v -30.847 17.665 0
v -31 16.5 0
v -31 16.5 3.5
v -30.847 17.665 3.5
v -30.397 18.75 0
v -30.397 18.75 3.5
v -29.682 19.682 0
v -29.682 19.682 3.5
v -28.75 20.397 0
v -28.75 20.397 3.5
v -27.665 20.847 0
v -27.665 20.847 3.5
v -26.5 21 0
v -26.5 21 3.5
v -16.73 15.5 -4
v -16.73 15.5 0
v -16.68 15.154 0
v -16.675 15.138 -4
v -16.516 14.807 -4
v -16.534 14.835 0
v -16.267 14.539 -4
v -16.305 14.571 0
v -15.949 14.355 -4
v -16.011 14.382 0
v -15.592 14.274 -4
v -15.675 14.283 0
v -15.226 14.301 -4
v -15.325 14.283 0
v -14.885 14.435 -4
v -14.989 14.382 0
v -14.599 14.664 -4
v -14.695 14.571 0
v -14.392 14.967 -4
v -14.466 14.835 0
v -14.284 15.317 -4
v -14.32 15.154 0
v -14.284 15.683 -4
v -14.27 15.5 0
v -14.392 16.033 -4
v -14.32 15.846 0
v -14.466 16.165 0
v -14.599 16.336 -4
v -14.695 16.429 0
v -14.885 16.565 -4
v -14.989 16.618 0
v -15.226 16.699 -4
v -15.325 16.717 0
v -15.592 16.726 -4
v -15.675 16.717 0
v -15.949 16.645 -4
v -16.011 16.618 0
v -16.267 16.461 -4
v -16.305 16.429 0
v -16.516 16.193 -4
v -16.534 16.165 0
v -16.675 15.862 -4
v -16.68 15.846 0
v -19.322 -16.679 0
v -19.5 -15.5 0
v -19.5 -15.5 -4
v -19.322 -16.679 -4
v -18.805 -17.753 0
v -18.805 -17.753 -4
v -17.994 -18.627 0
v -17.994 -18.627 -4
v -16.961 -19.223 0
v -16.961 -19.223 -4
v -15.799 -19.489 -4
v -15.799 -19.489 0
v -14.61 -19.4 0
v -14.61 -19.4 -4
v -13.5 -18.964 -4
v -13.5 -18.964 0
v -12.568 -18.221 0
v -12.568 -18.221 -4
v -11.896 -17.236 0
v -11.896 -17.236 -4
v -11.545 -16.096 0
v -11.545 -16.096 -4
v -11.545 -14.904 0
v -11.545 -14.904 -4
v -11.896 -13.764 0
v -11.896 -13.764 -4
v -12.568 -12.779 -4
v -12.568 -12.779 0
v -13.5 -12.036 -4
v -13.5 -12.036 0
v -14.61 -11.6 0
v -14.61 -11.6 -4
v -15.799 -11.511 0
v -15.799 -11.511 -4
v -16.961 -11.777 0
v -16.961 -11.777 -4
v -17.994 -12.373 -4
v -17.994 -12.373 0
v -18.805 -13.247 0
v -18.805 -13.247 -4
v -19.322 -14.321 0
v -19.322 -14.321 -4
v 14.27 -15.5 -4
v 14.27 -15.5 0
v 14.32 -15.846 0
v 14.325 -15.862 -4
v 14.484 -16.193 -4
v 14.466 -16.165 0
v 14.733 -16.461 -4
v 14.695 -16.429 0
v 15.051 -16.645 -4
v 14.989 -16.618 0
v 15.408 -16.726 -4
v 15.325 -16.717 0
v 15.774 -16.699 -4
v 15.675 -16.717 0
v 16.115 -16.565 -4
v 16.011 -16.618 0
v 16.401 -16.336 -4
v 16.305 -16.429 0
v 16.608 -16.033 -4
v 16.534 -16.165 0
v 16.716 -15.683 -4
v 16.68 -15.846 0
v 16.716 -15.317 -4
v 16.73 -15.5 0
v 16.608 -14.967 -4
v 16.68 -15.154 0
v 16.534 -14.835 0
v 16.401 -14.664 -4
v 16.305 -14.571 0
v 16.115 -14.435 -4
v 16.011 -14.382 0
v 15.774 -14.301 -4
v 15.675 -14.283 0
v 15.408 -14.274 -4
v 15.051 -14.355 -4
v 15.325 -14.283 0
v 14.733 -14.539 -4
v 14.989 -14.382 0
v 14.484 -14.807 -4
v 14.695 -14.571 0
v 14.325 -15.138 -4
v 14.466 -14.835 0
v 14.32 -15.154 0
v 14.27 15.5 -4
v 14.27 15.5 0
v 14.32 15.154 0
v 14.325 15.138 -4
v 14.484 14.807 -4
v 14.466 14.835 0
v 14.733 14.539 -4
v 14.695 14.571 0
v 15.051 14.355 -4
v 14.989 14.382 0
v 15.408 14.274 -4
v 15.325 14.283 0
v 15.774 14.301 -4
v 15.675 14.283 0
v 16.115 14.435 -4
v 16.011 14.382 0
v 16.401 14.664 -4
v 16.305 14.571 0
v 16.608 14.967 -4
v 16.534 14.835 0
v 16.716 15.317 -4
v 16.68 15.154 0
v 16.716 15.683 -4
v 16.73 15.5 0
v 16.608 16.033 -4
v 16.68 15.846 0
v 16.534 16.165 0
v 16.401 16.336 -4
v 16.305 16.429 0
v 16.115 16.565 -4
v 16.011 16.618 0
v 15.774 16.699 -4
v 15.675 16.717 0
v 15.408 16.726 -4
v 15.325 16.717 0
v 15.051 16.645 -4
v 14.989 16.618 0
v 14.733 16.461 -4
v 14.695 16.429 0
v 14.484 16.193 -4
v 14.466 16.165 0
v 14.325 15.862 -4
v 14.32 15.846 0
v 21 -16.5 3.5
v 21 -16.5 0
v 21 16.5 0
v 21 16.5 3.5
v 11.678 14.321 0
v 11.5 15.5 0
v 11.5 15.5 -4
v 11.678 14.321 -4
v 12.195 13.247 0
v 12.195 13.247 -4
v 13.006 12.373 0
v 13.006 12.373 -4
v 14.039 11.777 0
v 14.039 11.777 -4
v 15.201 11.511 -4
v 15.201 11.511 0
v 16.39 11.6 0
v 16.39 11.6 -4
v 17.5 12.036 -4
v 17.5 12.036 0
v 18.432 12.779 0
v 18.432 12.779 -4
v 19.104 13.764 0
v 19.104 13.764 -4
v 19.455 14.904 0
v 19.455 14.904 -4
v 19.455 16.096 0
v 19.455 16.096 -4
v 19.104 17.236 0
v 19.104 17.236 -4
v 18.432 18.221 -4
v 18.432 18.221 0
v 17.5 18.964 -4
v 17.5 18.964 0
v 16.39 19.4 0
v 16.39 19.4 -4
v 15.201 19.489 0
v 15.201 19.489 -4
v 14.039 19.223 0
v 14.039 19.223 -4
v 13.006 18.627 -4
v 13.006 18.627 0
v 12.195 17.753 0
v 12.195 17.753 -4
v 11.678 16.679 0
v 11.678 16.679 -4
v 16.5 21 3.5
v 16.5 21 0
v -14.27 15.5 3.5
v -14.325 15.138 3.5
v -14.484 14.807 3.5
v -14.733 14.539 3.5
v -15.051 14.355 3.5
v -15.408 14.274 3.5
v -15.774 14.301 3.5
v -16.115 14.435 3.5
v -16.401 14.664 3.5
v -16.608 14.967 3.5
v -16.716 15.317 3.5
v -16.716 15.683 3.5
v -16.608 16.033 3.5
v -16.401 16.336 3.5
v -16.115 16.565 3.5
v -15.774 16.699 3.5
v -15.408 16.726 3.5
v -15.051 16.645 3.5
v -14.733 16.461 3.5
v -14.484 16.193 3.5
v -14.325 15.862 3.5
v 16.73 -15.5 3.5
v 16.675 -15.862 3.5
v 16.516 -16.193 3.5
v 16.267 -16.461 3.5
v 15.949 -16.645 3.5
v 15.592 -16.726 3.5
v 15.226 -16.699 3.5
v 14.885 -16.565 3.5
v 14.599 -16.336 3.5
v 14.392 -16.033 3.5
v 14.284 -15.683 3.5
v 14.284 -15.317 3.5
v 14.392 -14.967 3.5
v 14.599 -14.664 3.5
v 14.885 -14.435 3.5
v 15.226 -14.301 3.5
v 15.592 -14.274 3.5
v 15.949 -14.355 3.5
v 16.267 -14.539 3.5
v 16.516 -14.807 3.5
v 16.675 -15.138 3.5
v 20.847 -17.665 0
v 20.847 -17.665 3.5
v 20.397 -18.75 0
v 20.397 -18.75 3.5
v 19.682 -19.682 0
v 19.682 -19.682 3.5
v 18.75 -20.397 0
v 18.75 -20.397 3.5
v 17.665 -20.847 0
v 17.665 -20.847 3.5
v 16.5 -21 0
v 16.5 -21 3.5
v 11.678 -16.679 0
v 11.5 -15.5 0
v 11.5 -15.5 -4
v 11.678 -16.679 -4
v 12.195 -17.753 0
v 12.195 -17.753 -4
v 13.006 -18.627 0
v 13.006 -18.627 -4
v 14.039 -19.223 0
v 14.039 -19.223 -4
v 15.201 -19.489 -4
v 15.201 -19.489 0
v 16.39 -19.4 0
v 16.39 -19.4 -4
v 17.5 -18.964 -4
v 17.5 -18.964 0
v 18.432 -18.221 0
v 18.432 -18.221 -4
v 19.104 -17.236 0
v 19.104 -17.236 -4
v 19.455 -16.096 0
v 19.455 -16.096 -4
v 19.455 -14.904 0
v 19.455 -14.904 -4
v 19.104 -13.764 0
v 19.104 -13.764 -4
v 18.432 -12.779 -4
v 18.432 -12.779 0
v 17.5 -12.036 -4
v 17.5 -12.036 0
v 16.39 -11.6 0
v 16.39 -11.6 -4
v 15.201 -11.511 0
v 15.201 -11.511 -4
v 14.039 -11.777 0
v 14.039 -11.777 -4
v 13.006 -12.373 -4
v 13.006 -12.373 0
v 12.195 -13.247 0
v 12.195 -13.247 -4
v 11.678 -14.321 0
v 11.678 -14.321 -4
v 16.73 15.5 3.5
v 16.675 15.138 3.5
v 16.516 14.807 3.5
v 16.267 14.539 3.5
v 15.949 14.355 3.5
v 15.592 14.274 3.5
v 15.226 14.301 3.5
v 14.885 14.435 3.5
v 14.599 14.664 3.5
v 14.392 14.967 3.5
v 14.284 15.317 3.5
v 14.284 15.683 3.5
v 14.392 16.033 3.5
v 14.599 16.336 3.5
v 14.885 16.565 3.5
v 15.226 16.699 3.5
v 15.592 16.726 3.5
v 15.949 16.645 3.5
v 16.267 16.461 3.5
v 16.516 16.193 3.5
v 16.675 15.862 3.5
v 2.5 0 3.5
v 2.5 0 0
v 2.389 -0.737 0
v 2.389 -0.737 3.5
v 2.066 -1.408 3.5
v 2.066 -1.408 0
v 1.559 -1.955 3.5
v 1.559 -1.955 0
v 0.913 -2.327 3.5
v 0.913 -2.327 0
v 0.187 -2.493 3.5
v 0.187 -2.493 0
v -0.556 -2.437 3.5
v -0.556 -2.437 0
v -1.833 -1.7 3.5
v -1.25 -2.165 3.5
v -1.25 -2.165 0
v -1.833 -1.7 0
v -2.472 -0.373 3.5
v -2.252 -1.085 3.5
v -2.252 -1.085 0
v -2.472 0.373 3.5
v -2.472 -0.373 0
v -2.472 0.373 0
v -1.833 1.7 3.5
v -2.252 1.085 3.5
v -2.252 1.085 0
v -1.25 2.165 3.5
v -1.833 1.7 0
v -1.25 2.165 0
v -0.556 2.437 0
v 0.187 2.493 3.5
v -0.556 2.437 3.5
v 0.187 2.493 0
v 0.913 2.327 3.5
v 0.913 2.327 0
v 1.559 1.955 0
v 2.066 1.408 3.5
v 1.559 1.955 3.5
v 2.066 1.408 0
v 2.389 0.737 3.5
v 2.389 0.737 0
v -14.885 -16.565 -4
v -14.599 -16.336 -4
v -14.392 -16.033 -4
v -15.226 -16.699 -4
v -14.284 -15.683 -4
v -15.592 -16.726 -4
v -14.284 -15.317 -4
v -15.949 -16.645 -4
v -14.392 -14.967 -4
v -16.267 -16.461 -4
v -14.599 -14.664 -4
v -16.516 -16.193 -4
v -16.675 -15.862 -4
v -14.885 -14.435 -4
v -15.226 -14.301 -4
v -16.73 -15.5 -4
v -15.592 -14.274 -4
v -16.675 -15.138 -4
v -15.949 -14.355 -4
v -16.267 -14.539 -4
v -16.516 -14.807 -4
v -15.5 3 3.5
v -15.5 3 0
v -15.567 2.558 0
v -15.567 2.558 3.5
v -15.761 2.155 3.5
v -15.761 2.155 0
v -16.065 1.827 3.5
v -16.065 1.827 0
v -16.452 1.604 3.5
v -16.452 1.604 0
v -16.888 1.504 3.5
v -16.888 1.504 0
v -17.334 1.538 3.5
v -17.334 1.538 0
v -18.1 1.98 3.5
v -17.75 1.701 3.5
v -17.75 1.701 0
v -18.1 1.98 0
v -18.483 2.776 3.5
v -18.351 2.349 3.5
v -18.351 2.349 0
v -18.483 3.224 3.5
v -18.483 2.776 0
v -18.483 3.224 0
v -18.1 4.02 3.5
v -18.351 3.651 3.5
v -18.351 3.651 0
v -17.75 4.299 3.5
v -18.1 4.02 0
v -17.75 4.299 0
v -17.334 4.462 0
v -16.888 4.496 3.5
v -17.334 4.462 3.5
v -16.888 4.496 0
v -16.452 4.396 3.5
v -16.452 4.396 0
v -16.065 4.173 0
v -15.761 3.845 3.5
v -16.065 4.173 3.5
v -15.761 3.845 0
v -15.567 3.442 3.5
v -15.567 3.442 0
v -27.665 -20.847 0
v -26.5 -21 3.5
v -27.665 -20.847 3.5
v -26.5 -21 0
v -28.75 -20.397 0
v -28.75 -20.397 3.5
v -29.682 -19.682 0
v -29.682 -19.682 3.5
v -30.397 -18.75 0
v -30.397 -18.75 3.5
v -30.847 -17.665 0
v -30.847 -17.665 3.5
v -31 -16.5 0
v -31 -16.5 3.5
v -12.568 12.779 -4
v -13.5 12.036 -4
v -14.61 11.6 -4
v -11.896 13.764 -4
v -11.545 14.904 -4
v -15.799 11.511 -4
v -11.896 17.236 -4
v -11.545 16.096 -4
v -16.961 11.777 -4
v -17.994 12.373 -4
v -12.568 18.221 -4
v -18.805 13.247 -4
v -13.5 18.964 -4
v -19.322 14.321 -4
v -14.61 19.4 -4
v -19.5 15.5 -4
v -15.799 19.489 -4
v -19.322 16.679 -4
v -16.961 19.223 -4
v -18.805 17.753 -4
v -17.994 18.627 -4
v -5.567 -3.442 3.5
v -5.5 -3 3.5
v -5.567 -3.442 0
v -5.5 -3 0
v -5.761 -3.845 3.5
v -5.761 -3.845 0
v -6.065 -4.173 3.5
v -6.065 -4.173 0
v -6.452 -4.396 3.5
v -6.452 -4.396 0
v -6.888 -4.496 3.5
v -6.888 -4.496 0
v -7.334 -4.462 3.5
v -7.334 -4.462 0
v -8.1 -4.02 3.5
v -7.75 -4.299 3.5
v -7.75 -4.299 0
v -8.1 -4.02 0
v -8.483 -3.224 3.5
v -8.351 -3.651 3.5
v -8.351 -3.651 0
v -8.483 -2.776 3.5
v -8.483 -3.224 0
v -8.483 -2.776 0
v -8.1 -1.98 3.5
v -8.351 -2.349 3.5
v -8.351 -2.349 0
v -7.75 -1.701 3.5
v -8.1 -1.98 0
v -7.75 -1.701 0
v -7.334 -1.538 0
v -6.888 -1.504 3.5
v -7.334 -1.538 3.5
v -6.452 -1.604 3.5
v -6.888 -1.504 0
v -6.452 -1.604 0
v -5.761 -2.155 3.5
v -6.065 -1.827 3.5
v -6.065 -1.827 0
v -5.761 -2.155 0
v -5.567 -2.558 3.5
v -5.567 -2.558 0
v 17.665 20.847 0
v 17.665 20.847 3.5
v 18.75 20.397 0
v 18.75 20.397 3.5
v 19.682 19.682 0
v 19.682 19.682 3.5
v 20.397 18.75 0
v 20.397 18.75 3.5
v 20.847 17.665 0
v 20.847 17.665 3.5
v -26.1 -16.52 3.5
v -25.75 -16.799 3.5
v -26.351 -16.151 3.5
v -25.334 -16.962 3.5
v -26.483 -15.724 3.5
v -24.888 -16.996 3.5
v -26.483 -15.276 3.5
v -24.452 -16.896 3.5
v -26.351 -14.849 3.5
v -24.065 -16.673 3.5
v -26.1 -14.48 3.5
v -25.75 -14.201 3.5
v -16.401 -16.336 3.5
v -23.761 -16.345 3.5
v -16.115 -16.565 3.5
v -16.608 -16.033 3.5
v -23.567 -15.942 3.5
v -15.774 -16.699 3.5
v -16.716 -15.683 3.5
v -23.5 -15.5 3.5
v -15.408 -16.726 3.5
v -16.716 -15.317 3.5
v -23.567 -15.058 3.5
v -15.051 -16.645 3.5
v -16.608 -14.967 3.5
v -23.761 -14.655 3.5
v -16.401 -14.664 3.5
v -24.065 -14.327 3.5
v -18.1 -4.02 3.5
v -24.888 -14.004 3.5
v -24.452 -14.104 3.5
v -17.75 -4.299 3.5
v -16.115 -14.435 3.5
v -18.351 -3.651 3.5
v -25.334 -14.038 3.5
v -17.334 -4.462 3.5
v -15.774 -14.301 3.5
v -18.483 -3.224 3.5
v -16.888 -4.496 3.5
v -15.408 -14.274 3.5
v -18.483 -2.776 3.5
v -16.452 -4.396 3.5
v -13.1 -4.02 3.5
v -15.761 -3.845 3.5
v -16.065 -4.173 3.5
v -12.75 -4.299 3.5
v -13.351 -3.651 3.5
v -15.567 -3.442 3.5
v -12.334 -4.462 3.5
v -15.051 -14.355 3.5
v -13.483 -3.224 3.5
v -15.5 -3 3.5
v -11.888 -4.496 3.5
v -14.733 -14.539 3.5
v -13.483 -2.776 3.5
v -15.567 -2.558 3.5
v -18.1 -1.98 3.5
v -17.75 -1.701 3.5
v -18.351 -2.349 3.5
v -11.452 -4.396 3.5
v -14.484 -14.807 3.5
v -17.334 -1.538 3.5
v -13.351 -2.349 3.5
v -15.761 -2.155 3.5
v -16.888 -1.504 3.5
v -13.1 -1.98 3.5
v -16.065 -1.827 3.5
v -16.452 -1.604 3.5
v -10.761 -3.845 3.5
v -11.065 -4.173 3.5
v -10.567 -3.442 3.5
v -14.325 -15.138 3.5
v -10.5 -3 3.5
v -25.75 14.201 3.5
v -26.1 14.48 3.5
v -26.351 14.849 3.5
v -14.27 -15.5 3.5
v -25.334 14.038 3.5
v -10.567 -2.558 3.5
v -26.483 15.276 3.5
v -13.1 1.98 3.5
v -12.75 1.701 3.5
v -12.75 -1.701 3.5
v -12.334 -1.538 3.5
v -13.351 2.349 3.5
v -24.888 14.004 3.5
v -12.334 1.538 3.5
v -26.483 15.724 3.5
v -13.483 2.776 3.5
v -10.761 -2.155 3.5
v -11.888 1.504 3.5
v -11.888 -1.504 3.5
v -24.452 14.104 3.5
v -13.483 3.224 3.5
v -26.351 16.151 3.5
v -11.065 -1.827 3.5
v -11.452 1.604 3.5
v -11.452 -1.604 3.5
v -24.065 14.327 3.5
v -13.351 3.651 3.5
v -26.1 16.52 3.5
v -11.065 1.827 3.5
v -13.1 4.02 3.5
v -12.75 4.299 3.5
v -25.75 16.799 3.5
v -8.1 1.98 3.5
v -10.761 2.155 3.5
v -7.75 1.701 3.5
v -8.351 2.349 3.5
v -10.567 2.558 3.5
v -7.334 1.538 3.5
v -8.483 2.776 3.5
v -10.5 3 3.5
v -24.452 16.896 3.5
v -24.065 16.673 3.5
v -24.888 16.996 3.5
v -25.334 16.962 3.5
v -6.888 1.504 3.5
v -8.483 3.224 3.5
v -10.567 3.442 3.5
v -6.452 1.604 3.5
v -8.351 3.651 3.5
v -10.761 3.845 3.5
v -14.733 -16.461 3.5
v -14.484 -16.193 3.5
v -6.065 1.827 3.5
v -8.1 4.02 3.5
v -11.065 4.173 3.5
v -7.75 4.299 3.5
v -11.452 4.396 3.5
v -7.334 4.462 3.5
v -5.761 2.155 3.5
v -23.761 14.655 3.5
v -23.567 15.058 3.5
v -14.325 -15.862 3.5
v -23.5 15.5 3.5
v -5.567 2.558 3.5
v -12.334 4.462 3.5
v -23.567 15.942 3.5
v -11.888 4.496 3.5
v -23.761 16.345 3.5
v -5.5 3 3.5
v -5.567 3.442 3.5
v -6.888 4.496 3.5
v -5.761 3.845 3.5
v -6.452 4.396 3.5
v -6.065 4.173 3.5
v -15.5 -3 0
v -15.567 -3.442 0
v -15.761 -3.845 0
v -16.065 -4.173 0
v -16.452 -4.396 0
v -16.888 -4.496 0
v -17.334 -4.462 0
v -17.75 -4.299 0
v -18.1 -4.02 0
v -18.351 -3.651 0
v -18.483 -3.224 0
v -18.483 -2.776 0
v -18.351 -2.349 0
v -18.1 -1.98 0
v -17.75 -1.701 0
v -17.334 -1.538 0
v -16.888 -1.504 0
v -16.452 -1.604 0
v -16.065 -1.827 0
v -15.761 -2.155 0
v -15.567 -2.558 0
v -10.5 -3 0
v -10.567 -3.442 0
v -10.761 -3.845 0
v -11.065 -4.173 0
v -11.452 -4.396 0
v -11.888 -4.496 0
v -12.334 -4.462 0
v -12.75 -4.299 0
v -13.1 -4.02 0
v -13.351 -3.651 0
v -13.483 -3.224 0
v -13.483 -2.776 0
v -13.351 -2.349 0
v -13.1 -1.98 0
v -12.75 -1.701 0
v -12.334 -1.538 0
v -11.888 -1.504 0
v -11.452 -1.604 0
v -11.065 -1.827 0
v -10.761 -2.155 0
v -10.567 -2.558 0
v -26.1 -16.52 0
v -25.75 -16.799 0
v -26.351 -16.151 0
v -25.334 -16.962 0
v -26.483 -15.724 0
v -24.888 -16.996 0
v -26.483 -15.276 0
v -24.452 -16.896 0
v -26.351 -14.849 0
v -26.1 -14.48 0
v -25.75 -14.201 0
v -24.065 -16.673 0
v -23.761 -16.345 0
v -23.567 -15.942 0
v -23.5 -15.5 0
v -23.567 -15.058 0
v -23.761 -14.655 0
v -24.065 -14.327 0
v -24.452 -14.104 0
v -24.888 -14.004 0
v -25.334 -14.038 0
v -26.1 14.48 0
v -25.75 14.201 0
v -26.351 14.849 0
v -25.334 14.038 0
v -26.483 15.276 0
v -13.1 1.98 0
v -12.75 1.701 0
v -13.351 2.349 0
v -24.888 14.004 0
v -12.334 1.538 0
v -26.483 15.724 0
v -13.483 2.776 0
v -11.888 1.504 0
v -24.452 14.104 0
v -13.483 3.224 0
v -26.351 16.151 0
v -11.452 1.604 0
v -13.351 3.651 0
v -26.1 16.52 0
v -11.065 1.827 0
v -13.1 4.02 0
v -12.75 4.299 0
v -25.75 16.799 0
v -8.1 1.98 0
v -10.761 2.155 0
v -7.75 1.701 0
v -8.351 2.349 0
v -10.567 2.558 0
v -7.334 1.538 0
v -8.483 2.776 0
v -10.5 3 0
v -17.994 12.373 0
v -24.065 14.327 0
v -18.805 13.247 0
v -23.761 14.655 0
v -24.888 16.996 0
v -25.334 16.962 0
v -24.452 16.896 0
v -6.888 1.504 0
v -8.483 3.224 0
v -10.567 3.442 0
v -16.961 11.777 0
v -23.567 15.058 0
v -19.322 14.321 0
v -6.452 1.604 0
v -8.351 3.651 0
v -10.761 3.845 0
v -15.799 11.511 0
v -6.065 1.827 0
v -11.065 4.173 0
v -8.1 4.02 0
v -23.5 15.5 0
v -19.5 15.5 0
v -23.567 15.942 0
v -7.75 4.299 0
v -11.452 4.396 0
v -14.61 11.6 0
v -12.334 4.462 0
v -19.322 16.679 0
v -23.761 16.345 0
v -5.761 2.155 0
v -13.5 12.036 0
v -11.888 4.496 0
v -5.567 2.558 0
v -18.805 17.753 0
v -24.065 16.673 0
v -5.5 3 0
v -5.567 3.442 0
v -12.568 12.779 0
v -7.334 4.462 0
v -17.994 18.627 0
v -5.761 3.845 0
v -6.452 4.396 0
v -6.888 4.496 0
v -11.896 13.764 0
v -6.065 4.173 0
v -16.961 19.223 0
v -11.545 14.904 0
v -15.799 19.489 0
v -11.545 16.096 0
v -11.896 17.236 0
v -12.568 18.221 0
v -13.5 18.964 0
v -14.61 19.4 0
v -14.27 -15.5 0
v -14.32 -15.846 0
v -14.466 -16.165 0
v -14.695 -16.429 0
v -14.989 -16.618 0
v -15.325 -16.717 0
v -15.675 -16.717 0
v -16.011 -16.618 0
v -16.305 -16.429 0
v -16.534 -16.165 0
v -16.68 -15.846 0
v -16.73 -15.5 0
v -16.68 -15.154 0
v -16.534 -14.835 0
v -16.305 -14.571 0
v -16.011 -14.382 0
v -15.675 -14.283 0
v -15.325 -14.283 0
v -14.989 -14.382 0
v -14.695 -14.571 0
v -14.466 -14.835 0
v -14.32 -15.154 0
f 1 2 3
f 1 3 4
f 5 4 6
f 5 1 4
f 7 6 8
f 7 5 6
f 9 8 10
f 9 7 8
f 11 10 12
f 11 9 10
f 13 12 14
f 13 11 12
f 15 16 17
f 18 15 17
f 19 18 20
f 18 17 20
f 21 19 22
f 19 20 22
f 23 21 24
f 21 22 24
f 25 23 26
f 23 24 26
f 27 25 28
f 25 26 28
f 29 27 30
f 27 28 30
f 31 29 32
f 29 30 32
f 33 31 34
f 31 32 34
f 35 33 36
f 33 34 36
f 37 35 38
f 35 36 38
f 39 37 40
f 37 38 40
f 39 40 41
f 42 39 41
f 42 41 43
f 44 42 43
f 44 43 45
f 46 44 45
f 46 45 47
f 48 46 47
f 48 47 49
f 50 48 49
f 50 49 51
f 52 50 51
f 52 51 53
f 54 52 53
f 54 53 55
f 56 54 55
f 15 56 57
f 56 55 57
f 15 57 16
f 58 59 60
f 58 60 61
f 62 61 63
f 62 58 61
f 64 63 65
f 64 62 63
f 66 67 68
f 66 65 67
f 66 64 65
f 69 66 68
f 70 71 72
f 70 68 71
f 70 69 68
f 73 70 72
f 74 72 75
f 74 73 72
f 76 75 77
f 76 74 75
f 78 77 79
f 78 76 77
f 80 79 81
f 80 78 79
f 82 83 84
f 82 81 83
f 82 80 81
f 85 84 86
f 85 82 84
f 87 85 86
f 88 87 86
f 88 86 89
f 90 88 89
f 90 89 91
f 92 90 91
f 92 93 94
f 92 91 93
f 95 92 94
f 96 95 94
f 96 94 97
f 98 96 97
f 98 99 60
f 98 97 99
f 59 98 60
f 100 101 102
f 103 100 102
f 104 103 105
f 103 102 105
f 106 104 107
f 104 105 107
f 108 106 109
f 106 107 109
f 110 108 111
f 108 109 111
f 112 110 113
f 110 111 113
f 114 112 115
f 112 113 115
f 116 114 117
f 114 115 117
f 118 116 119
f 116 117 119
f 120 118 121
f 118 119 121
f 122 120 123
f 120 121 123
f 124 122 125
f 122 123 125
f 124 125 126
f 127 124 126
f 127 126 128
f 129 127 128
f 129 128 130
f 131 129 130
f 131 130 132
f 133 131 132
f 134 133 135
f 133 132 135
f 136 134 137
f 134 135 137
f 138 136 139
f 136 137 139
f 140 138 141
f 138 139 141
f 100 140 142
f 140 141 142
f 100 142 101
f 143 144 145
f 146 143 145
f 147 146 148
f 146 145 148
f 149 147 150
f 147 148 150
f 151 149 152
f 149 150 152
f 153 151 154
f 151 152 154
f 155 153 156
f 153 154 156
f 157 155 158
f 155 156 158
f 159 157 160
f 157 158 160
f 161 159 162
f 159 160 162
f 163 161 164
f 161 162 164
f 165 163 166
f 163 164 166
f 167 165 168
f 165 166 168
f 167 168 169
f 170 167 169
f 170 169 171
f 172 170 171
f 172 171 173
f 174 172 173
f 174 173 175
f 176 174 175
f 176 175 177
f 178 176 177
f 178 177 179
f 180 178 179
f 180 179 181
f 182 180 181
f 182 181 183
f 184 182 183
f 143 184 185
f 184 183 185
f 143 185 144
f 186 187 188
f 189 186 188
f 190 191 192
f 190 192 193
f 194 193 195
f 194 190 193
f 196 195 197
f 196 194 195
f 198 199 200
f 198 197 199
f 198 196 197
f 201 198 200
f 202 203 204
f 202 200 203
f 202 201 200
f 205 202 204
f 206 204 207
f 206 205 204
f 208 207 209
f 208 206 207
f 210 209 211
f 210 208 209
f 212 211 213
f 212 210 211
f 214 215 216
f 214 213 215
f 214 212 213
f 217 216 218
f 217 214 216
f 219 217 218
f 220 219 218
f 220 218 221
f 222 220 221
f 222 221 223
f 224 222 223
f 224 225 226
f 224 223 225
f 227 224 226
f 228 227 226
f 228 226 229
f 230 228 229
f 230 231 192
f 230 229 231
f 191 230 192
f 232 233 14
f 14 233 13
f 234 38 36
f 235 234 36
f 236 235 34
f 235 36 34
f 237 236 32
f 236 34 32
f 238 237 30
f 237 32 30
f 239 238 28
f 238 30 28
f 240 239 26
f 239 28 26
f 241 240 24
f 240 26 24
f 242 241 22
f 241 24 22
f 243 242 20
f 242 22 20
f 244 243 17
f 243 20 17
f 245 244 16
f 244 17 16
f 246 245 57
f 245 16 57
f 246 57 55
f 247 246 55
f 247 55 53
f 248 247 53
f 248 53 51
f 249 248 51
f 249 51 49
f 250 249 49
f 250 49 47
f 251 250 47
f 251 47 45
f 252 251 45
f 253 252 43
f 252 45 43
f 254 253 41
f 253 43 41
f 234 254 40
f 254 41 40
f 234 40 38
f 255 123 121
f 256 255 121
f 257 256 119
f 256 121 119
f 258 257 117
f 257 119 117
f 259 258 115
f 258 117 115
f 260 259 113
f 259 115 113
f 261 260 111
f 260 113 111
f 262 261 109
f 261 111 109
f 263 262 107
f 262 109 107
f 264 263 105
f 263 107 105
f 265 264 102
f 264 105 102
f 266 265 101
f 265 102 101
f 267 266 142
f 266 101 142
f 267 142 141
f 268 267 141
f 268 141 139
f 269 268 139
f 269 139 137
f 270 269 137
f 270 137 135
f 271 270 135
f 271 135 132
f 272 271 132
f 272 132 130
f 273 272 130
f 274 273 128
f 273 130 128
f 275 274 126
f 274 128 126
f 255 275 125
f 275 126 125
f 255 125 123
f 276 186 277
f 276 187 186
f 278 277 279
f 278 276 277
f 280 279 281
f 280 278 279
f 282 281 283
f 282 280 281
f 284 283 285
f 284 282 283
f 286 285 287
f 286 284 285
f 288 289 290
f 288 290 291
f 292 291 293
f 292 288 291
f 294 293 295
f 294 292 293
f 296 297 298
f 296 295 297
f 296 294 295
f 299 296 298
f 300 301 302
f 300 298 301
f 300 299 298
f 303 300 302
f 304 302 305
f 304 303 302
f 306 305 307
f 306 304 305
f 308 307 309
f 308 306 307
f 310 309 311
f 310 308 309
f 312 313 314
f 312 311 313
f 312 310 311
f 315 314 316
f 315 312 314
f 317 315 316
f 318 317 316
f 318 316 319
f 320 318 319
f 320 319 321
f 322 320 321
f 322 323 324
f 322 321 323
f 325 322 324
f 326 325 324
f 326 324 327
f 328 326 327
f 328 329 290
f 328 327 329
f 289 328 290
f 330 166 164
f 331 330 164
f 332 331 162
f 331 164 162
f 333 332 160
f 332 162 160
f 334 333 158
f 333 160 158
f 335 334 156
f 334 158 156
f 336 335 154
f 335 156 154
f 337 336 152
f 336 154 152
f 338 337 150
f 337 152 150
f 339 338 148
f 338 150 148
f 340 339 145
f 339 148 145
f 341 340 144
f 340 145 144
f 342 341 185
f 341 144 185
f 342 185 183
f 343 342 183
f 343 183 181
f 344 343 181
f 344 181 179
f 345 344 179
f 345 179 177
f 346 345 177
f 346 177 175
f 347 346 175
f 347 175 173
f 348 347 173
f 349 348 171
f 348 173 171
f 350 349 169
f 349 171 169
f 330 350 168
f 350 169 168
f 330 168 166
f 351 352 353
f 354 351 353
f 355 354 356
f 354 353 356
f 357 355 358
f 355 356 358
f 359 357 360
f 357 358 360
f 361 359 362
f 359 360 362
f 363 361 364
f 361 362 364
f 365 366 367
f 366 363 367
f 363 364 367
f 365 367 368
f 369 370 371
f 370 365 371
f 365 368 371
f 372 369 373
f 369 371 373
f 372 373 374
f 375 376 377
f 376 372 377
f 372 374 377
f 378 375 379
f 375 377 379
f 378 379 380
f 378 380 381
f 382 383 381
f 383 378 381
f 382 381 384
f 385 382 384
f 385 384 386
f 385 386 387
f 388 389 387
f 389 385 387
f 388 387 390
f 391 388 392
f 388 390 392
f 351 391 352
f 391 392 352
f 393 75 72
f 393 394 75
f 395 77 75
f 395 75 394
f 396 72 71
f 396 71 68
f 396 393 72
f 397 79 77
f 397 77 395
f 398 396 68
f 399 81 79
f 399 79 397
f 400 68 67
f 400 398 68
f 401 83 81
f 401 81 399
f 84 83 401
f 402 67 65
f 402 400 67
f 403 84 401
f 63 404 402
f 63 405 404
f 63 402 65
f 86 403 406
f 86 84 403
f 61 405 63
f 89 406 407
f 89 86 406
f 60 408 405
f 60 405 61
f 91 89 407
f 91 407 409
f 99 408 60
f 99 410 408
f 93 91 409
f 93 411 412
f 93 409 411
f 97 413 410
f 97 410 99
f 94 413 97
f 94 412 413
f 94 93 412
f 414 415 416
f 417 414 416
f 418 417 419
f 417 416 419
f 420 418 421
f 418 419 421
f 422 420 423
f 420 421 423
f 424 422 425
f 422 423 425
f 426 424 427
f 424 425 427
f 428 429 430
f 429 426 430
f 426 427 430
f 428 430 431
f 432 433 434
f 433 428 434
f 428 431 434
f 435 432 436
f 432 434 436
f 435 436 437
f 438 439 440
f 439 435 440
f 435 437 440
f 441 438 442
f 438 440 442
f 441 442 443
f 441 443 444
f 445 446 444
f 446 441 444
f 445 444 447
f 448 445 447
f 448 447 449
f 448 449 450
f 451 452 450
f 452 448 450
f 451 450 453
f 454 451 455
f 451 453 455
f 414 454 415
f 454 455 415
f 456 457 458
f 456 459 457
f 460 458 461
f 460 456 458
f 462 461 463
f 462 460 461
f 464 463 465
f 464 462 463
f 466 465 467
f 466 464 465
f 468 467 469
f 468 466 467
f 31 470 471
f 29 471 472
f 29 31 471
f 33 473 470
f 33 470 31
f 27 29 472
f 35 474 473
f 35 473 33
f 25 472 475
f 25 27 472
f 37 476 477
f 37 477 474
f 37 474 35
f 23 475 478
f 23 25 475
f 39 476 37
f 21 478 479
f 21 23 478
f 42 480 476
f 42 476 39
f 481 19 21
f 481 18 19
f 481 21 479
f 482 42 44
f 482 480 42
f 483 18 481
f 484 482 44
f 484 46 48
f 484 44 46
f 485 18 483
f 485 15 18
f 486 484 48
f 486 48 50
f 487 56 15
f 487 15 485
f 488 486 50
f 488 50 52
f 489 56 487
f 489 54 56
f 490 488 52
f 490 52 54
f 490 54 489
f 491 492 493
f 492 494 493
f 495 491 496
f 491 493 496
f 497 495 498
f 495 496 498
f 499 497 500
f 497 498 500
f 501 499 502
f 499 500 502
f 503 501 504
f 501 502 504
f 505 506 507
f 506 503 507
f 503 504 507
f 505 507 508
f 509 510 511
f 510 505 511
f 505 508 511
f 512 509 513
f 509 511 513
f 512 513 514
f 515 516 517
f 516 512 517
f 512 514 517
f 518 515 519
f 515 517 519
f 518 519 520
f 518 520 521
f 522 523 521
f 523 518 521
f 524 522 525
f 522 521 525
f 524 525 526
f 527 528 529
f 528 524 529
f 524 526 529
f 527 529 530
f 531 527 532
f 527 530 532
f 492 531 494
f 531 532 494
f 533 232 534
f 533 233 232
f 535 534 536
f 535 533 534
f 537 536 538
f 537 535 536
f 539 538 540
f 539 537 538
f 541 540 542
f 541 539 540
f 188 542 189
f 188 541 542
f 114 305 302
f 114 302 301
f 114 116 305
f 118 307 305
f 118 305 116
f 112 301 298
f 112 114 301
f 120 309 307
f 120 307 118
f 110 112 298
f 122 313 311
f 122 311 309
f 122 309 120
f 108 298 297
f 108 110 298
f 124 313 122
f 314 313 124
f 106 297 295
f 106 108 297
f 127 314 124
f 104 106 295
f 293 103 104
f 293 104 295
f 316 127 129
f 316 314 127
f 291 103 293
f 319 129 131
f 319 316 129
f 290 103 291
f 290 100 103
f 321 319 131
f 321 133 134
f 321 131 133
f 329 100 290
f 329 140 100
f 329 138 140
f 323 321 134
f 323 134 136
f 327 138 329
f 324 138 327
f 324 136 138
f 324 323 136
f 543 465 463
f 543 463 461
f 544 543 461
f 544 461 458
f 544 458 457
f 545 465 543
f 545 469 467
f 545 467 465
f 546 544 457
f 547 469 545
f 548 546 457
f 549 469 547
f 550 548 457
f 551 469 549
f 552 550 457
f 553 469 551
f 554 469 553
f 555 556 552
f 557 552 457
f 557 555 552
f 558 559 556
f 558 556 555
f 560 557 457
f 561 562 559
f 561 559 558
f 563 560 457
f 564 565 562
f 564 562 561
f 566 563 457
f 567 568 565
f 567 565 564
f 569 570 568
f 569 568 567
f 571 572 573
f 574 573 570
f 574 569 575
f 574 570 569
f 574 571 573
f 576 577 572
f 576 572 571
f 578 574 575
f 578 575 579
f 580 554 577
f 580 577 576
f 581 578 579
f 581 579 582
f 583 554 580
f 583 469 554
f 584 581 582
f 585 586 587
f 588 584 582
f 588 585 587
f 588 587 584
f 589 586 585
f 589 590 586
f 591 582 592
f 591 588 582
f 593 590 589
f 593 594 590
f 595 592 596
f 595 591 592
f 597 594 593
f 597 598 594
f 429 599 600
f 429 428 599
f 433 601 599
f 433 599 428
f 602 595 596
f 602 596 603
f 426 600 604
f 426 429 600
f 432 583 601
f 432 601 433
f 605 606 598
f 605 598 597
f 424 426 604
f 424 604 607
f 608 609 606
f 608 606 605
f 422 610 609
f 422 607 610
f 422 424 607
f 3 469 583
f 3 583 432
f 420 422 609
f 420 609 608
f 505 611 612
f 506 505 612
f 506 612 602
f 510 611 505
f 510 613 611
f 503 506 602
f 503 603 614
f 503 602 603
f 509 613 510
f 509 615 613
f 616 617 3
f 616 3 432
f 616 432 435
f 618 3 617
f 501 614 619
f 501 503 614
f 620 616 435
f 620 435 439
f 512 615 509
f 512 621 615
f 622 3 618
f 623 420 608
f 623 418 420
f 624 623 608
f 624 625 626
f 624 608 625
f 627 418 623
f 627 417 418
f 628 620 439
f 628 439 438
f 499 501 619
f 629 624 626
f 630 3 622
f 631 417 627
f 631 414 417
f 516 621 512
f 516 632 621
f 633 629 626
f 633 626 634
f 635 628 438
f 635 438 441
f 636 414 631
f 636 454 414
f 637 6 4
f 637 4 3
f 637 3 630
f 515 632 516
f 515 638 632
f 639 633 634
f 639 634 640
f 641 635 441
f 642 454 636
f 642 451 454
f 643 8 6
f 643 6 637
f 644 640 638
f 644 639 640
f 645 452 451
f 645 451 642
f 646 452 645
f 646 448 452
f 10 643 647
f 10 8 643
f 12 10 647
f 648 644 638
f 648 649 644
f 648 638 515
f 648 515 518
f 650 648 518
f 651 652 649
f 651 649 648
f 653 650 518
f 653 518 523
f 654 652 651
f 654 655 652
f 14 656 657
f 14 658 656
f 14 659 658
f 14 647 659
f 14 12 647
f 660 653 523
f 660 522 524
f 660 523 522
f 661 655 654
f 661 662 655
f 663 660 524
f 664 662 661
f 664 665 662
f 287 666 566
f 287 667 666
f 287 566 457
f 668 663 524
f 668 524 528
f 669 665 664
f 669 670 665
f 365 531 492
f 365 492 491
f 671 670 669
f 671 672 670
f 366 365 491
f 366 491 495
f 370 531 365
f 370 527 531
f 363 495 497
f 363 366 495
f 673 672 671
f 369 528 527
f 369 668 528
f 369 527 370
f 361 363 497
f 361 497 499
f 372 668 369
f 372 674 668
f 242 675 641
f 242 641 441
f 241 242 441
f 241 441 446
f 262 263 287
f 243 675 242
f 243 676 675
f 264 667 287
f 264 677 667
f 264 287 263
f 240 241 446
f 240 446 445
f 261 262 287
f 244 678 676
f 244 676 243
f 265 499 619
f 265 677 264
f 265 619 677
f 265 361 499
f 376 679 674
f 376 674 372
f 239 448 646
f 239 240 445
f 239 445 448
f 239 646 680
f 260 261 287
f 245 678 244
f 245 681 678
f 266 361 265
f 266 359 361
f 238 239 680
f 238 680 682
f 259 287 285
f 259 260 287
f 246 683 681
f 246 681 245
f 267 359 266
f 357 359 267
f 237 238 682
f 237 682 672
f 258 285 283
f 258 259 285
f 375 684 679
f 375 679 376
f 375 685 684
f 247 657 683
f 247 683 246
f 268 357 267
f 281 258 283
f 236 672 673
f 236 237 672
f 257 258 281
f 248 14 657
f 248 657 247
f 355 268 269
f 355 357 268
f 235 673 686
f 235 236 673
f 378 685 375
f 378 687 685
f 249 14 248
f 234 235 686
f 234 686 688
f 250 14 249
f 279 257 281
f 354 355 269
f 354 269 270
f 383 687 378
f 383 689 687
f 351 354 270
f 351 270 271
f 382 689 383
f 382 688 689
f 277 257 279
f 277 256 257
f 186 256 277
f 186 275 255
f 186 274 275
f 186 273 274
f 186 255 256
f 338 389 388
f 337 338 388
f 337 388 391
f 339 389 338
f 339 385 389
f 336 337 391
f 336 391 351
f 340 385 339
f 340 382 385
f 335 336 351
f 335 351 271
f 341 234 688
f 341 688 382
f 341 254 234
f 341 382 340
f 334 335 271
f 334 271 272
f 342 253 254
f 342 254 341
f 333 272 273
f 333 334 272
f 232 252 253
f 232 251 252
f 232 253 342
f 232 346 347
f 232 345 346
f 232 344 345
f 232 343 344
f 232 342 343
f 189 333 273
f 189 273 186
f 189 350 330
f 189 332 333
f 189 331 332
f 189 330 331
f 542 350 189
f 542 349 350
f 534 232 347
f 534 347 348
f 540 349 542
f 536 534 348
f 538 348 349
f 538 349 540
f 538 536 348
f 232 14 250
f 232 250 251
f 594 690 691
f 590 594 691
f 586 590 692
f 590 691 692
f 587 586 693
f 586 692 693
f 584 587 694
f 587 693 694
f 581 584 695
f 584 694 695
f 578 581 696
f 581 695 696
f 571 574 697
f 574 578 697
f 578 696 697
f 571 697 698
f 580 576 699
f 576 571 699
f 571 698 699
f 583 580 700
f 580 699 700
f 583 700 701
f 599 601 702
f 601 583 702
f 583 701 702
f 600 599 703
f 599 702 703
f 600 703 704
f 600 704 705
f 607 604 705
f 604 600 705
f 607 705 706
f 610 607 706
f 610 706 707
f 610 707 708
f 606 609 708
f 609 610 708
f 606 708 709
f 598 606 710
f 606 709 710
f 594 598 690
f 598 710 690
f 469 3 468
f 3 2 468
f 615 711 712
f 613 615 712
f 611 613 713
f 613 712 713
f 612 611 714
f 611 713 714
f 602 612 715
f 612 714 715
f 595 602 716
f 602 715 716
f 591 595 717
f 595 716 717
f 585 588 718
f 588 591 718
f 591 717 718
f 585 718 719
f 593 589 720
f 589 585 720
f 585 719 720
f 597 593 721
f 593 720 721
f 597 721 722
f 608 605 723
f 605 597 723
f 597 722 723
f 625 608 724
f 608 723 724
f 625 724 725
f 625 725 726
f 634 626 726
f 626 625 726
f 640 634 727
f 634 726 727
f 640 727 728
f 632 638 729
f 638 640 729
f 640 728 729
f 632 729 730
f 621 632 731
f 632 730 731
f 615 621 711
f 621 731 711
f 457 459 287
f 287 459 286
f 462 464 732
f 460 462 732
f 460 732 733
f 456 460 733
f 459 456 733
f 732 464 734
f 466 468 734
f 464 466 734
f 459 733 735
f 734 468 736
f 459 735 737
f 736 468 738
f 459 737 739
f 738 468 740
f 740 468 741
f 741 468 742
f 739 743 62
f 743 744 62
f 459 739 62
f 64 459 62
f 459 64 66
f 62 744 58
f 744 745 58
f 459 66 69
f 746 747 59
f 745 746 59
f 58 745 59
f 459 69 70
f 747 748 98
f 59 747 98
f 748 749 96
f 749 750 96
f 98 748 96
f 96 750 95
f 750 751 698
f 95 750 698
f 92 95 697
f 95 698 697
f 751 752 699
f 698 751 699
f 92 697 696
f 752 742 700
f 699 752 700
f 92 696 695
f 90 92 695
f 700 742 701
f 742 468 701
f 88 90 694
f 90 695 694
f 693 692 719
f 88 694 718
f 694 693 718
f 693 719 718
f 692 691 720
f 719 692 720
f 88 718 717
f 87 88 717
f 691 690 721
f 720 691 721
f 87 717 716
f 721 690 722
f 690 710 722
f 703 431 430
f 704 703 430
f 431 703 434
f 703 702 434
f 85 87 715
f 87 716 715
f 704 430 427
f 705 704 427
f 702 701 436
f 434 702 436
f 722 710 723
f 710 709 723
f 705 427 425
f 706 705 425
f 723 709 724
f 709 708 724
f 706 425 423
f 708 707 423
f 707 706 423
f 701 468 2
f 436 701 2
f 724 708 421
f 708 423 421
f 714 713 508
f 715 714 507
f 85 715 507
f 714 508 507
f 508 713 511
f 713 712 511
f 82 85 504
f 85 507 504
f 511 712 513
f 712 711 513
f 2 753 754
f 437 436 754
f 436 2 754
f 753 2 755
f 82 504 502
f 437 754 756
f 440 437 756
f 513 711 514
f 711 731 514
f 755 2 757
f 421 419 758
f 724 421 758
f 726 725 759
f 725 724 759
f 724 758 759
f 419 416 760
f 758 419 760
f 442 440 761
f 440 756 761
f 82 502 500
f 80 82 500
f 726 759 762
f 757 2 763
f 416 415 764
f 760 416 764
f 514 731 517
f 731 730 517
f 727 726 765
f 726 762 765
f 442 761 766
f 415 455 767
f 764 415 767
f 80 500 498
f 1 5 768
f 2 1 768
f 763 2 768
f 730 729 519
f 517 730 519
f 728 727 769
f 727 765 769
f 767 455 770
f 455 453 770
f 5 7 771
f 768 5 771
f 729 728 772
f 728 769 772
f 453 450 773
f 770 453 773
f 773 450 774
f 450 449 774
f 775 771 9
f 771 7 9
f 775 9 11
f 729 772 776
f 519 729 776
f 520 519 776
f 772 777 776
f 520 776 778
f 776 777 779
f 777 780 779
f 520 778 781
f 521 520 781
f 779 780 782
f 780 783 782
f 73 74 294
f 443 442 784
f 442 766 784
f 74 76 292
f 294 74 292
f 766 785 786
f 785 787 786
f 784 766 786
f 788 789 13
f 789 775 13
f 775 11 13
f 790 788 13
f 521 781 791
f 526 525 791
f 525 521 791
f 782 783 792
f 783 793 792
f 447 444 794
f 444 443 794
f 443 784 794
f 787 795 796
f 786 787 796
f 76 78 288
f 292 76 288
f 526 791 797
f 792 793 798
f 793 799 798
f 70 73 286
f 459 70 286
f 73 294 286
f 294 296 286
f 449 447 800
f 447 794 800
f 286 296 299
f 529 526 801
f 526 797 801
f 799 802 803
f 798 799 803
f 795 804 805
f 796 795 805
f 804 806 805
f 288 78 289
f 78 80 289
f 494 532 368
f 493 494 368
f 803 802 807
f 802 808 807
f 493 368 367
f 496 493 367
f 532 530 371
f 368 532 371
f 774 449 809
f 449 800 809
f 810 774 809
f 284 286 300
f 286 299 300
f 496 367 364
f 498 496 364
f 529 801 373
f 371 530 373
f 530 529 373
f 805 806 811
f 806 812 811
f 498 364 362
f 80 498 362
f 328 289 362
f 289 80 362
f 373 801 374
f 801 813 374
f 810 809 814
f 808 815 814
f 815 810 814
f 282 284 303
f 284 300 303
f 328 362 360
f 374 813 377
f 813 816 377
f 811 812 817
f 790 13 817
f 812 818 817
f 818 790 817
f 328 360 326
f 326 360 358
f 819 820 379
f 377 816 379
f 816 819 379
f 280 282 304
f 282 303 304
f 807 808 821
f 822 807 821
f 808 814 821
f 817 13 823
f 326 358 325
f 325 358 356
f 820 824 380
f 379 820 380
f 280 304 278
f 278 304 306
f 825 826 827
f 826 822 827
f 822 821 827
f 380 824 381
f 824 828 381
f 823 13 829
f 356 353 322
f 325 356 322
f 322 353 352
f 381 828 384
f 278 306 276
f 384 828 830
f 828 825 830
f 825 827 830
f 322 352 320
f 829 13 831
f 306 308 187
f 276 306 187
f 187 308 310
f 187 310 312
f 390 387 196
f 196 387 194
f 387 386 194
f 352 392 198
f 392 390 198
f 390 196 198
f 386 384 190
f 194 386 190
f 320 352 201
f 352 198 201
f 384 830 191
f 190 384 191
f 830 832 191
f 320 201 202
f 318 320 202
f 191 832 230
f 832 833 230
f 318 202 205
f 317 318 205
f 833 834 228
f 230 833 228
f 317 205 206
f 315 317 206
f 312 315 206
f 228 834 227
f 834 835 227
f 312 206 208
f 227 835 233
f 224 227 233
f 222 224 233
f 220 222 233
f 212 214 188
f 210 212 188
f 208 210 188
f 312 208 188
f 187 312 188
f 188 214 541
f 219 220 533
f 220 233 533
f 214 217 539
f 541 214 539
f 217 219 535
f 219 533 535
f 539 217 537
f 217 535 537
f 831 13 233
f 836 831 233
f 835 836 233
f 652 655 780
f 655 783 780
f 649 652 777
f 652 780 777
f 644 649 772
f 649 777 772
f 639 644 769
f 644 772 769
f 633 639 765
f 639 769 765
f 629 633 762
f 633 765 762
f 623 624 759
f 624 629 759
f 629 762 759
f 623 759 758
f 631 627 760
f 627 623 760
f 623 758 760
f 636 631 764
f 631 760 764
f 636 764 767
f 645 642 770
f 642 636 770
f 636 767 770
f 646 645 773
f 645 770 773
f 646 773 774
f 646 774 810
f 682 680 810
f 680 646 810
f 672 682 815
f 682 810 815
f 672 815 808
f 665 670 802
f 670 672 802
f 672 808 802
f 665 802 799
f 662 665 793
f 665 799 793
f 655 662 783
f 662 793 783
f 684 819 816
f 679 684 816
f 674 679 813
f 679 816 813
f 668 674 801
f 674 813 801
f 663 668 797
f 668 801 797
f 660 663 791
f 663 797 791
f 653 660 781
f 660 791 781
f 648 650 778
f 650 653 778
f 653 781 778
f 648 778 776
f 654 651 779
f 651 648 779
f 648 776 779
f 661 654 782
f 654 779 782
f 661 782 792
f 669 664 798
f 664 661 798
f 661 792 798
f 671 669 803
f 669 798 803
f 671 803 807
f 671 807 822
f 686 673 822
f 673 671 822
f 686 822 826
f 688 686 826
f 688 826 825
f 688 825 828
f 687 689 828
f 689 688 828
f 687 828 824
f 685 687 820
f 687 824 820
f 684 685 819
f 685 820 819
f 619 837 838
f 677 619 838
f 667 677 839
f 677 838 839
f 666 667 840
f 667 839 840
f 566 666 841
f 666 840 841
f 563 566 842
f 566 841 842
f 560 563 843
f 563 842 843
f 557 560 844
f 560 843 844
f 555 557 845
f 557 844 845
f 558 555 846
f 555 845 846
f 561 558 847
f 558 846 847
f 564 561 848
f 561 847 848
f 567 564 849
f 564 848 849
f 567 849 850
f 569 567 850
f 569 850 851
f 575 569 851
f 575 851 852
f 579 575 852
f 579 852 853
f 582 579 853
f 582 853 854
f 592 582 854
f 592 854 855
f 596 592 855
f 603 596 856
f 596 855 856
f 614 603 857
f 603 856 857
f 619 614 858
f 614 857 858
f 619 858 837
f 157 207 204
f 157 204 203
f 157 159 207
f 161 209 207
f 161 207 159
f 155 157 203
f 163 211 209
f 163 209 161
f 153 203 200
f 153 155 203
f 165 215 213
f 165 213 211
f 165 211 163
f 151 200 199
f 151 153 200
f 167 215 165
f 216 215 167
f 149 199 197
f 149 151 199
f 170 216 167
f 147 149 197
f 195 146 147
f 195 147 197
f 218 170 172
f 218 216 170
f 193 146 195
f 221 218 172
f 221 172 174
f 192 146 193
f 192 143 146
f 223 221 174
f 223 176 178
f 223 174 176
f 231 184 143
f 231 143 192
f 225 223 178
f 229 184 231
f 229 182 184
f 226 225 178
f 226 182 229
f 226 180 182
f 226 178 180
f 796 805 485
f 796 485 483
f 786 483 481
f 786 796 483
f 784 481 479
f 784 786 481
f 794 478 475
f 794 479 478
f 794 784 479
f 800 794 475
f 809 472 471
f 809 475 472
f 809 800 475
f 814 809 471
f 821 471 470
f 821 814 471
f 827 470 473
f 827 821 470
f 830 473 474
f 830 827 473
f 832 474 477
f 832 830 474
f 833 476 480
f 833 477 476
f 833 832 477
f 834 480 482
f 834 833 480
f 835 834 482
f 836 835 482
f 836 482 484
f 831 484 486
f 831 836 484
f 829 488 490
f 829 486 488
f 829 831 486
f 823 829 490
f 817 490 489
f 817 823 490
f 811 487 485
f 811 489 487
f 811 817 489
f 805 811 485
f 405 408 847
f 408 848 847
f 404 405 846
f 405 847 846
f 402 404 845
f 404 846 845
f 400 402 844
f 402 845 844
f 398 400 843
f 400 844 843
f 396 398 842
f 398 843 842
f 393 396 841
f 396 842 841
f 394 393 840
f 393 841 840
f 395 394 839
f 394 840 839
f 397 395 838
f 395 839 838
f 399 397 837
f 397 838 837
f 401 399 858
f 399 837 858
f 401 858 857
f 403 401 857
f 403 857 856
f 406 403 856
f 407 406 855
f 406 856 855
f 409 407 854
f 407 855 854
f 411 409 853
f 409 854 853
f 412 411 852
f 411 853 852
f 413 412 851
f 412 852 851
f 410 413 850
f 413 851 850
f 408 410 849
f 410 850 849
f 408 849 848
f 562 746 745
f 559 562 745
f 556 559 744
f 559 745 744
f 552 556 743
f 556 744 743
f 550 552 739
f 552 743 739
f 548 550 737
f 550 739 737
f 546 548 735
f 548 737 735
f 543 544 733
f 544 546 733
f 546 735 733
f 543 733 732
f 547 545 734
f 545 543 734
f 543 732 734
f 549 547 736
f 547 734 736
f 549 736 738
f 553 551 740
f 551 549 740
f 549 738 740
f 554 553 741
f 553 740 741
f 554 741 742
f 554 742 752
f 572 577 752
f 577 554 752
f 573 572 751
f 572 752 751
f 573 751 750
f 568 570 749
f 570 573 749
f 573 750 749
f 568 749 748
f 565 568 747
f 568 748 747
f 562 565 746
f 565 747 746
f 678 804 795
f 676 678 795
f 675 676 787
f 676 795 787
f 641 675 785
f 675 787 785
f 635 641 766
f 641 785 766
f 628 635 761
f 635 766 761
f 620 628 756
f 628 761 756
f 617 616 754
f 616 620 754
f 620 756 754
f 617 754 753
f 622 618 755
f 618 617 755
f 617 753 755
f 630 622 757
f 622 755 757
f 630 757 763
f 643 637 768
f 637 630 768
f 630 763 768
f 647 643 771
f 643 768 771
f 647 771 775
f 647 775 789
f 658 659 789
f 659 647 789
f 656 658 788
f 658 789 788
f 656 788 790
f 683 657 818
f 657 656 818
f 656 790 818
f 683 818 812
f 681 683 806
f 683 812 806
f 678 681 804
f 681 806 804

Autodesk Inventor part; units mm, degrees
ref_plane "YZ Plane" through (0, 0, 0) normal (1, 0, 0) x (0, 1, 0)
ref_plane "XZ Plane" through (0, 0, 0) normal (0, 1, 0) x (-1, 0, 0)
ref_plane "XY Plane" through (0, 0, 0) normal (0, 0, 1) x (1, 0, 0)
sketch "Sketch1" plane through (0, 0, 0) normal (0, 0, 1) x (1, 0, 0)
  circle A0 centre (-15.5, -15.5) radius 1.2295 construction
  circle A1 centre (15.5, 15.5) radius 1.2295 construction
  circle A2 centre (15.5, -15.5) radius 1.2295 construction
  circle A3 centre (-15.5, 15.5) radius 1.2295 construction
  circle A4 centre (0, 0) radius 11 construction
  arc A5 (-16.5, 21) -> (-21, 16.5) centre (-16.5, 16.5) ccw construction
  line L0 (-21, 16.5) -> (-21, -16.5) construction
  arc A6 (-21, -16.5) -> (-16.5, -21) centre (-16.5, -16.5) ccw construction
  line L1 (-16.5, -21) -> (16.5, -21) construction
  arc A7 (16.5, -21) -> (21, -16.5) centre (16.5, -16.5) ccw construction
  line L2 (21, -16.5) -> (21, 16.5) construction
  arc A8 (21, 16.5) -> (16.5, 21) centre (16.5, 16.5) ccw construction
  line L3 (16.5, 21) -> (-16.5, 21) construction
  line L4 (16.5, 21) -> (-26.5, 21)
  line L5 (-31, 16.5) -> (-31, -16.5)
  line L6 (-26.5, -21) -> (16.5, -21)
  line L7 (21, -16.5) -> (21, 16.5)
  arc A9 (21, 16.5) -> (16.5, 21) centre (16.5, 16.5) ccw
  arc A10 (16.5, -21) -> (21, -16.5) centre (16.5, -16.5) ccw
  arc A11 (-31, -16.5) -> (-26.5, -21) centre (-26.5, -16.5) ccw
  arc A12 (-26.5, 21) -> (-31, 16.5) centre (-26.5, 16.5) ccw
  circle A13 centre (15.5, 15.5) radius 1.2295
  circle A14 centre (15.5, -15.5) radius 1.2295
  circle A15 centre (-15.5, -15.5) radius 1.2295
  circle A16 centre (-15.5, 15.5) radius 1.2295
  circle A17 centre (0, 0) radius 11 construction
  circle A18 centre (0, 0) radius 5 construction
  circle A19 centre (0, 0) radius 10 construction
  circle A20 centre (0, 0) radius 15 construction
  line L8 (-7, 3) -> (-7, -3) construction
  line L9 (-12, 3) -> (-12, -3) construction
  line L10 (-17, 3) -> (-17, -3) construction
  circle A21 centre (-7, 3) radius 1.5
  circle A22 centre (-7, -3) radius 1.5
  circle A23 centre (-12, 3) radius 1.5
  circle A24 centre (-12, -3) radius 1.5
  circle A25 centre (-17, 3) radius 1.5
  circle A26 centre (-17, -3) radius 1.5
  circle A27 centre (-25, 15.5) radius 1.5
  circle A28 centre (-25, -15.5) radius 1.5
  circle A29 centre (0, 0) radius 2.5
  point P0 (-7, 0)
  point P1 (-12, 0)
  point P2 (-17, 0)
  point P3 (-5, 0)
  point P4 (-10, 0)
  point P5 (-15, 0)
  point P6 (-10.5169, -3.2242)
  point P7 (-10.7969, -2.1042)
  point P8 (-10.7969, 2.1042)
  point P9 (-10.5169, 3.2242)
extrude "Extrusion1" add sketch "Sketch1" along normal blind 3.5
sketch "Sketch3" plane through (0, 0, 0) normal (0, 0, -1) x (-1, 0, 0)
  circle A0 centre (-15.5, 15.5) radius 1.2295 projected
  circle A1 centre (15.5, 15.5) radius 1.2295 projected
  circle A2 centre (15.5, -15.5) radius 1.2295 projected
  circle A3 centre (-15.5, -15.5) radius 1.2295 projected
  circle A4 centre (-15.5, 15.5) radius 4
  circle A5 centre (15.5, 15.5) radius 4
  circle A6 centre (15.5, -15.5) radius 4
  circle A7 centre (-15.5, -15.5) radius 4
  point P0 (0, 0)
  dimension "d37" = 8
  dimension "d38" = 8
  dimension "d39" = 8
  dimension "d40" = 8
extrude "Extrusion2" add sketch "Sketch3" along normal blind 4
equation "\"d38\" = d37"
equation "\"d39\" = d37"
equation "\"d40\" = d37"
equation "\"d6\" = d5"
equation "\"d7\" = d5"
equation "\"d5\" = 6"
properties part number "housing" material "PET Plastic"
